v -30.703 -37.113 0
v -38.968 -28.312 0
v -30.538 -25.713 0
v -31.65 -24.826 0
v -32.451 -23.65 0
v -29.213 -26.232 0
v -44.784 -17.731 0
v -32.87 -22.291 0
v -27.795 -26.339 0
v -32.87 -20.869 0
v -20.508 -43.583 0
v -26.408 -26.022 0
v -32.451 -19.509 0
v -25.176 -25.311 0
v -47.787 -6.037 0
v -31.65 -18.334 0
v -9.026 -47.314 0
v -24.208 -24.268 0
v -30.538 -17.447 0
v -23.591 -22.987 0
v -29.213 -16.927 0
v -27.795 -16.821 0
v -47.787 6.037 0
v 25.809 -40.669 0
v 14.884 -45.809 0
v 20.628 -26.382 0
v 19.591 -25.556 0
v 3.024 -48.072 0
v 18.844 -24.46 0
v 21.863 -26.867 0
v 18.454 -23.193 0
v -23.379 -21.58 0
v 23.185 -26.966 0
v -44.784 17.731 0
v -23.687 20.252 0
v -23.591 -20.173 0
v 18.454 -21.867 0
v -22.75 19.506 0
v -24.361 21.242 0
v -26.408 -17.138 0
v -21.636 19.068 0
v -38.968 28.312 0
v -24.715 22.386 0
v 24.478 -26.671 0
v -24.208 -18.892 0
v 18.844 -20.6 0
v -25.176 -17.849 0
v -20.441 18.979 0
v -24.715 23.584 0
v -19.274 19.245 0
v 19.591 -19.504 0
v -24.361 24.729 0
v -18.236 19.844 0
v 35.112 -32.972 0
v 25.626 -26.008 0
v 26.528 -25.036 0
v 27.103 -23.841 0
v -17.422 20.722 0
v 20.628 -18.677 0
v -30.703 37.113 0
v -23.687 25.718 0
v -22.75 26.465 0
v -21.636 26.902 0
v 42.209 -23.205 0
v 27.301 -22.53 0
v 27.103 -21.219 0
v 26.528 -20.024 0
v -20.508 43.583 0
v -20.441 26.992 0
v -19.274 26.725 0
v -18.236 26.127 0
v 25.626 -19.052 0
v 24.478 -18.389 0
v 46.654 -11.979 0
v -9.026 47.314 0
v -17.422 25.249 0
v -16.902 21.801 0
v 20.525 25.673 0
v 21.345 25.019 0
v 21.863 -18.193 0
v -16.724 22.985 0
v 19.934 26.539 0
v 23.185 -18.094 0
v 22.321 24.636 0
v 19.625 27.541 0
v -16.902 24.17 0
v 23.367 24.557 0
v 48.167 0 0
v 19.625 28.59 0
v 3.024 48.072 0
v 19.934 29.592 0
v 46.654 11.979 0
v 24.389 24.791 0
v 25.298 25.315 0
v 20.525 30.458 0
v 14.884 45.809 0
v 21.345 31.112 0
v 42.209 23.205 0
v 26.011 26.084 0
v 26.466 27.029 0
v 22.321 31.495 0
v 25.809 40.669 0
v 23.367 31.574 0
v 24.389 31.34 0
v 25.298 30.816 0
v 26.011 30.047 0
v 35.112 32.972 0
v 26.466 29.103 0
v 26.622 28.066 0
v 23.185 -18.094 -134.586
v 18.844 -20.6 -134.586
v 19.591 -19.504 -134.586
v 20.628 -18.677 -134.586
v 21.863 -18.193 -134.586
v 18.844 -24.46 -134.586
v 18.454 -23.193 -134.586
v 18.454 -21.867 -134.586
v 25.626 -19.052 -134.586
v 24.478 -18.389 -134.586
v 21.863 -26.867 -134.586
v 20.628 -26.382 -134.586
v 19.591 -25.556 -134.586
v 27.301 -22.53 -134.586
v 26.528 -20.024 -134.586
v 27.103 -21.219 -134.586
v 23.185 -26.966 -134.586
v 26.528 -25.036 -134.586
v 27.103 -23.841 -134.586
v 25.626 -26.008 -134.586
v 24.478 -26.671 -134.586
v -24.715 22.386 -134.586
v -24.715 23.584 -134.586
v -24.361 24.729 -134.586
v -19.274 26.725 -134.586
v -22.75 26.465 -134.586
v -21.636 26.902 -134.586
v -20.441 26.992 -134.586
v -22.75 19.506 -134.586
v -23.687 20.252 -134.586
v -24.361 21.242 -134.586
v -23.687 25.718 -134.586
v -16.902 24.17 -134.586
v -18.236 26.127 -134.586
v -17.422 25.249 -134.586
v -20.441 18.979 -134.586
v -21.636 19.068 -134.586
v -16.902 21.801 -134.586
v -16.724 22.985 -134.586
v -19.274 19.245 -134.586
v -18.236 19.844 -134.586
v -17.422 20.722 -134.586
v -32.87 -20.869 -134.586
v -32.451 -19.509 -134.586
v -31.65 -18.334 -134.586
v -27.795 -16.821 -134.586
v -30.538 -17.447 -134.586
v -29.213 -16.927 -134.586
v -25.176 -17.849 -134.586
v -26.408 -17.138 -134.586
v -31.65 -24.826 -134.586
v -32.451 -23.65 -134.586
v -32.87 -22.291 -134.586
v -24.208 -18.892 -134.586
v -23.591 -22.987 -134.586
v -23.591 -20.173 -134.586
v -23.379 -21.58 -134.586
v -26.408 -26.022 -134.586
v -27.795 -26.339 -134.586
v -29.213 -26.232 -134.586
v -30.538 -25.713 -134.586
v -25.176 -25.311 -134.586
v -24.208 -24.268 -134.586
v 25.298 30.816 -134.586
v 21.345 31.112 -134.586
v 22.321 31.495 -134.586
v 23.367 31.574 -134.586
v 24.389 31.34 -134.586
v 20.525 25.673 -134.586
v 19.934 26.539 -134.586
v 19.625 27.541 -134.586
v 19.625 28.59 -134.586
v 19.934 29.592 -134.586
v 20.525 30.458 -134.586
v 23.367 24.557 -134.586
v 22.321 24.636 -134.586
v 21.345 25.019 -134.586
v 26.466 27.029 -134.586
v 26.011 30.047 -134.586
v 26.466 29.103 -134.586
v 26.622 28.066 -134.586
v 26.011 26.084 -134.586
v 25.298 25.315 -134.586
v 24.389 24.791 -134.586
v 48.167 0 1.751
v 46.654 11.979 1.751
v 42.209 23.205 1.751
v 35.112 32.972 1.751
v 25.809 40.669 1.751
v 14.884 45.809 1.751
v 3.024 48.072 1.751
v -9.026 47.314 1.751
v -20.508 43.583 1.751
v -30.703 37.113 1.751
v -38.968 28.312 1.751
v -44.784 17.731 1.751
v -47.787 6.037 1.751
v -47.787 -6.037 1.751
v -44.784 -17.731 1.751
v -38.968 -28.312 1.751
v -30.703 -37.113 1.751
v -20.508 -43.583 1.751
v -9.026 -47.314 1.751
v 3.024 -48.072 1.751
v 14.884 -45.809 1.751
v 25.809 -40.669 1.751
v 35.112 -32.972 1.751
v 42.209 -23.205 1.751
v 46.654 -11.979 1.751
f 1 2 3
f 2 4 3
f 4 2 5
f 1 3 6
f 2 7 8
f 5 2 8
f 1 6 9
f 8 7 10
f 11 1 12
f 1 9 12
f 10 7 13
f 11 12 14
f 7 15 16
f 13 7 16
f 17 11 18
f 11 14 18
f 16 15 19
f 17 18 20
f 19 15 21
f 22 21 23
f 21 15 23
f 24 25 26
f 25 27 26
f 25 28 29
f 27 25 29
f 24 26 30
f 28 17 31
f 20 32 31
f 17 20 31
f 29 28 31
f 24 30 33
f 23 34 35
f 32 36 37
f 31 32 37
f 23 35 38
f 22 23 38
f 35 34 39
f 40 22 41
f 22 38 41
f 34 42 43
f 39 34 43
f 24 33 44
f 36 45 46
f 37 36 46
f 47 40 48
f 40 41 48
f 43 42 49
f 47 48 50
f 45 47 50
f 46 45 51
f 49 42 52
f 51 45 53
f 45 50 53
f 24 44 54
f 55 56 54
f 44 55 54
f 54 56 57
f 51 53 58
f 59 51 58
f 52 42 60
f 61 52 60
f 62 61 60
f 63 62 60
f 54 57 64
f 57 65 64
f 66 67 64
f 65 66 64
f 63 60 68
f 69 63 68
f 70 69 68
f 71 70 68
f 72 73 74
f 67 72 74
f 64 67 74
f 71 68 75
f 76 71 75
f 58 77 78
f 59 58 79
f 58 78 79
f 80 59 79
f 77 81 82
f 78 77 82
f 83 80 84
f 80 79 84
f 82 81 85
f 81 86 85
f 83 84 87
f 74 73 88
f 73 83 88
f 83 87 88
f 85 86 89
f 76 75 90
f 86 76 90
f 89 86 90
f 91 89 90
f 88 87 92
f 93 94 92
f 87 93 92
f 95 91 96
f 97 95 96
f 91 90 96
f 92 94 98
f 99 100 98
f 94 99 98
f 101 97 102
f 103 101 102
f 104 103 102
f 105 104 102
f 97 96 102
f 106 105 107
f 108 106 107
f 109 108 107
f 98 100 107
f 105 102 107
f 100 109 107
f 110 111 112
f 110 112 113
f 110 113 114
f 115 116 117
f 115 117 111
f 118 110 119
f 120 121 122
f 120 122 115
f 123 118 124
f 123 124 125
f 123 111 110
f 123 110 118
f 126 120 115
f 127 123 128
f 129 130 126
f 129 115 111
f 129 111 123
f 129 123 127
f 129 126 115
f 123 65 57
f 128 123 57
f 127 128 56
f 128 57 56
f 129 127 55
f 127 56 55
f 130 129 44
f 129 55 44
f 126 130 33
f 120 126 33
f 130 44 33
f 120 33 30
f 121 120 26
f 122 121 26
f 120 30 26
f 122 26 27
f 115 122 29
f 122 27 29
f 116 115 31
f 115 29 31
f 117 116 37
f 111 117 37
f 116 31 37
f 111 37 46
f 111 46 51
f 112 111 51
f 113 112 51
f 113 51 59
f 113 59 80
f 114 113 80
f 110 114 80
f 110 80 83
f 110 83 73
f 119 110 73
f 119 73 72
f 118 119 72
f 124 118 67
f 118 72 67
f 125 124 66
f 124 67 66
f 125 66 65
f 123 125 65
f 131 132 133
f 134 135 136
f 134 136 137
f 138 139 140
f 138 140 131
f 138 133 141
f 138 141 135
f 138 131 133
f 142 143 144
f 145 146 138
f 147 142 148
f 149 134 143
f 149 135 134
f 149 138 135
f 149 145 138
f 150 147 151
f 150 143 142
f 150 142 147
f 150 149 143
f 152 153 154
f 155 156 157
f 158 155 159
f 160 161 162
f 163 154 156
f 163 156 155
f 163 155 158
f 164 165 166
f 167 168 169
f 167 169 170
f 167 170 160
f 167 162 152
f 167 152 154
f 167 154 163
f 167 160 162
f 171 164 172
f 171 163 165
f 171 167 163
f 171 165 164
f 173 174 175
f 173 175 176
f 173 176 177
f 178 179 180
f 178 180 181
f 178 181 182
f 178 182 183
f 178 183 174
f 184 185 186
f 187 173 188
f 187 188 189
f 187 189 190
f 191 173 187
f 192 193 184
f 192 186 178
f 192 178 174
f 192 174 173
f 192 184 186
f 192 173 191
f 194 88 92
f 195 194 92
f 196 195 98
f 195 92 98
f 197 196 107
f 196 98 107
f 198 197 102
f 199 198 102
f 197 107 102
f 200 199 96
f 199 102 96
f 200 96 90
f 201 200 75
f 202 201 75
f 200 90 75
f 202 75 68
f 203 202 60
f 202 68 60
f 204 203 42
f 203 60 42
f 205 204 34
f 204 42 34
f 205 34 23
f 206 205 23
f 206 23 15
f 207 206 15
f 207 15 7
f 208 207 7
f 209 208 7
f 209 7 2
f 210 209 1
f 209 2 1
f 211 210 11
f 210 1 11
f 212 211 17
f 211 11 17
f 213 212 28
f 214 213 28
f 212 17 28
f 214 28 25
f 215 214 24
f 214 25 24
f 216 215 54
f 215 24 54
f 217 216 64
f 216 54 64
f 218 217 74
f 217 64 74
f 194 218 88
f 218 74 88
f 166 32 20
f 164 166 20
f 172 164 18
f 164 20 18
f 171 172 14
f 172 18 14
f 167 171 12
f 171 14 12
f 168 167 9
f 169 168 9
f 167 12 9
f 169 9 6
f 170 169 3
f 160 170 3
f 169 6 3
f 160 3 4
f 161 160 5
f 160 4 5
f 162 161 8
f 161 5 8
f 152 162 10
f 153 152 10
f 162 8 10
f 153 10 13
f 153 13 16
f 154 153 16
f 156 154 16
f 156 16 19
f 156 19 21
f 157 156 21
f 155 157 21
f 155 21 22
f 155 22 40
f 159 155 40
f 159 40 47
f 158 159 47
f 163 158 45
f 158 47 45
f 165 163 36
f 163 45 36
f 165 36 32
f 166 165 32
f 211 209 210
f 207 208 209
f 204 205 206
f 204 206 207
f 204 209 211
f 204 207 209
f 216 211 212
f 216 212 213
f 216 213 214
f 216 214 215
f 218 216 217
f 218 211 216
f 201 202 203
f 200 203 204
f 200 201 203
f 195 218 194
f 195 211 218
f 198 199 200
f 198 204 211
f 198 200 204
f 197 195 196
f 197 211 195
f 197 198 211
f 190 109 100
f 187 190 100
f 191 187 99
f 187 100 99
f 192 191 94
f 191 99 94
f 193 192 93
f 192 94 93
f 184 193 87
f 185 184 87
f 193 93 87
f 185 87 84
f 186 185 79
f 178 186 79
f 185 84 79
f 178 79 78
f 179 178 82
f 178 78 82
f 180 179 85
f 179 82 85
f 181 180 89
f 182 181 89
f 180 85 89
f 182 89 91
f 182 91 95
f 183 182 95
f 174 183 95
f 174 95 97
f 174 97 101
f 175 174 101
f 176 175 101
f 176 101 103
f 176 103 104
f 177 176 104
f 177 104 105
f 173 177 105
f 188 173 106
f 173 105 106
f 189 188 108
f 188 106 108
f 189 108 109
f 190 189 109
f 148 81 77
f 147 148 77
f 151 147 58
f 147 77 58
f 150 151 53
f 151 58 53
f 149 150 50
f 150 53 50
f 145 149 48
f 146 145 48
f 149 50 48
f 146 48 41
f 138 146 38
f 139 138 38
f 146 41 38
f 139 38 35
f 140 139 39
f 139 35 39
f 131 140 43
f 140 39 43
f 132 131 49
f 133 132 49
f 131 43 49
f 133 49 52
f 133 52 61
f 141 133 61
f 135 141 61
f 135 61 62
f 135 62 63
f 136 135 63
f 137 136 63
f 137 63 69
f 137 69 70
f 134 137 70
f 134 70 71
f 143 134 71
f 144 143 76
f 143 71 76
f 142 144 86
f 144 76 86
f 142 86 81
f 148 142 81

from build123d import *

# Parameters (mm, degrees)
F0_R     = 48.166826
F1_DEPTH = 1.750732
F3_R     = 4.01791
F3_R_2   = 4.772257
F3_R_3   = 4.448486
F3_R_4   = 3.51804
F4_DEPTH = 134.586155


with BuildPart() as f1:
    # F0 (on Top) → F1 (new body)
    with BuildSketch(Plane.XY):
        Circle(F0_R)
    extrude(amount=F1_DEPTH)

    # F3 (on face) → F4 (join)
    with BuildSketch(Plane(origin=(0, 0, 0), x_dir=(1, 0, 0), z_dir=(0, 0, -1))):
        with Locations((-20.741474, -22.985213)):
            Circle(F3_R)
        with Locations((-28.151382, 21.579884)):
            Circle(F3_R_2)
        with Locations((22.852417, 22.529926)):
            Circle(F3_R_3)
        with Locations((23.104079, -28.06554)):
            Circle(F3_R_4)
    extrude(amount=F4_DEPTH)


solid = f1.part
